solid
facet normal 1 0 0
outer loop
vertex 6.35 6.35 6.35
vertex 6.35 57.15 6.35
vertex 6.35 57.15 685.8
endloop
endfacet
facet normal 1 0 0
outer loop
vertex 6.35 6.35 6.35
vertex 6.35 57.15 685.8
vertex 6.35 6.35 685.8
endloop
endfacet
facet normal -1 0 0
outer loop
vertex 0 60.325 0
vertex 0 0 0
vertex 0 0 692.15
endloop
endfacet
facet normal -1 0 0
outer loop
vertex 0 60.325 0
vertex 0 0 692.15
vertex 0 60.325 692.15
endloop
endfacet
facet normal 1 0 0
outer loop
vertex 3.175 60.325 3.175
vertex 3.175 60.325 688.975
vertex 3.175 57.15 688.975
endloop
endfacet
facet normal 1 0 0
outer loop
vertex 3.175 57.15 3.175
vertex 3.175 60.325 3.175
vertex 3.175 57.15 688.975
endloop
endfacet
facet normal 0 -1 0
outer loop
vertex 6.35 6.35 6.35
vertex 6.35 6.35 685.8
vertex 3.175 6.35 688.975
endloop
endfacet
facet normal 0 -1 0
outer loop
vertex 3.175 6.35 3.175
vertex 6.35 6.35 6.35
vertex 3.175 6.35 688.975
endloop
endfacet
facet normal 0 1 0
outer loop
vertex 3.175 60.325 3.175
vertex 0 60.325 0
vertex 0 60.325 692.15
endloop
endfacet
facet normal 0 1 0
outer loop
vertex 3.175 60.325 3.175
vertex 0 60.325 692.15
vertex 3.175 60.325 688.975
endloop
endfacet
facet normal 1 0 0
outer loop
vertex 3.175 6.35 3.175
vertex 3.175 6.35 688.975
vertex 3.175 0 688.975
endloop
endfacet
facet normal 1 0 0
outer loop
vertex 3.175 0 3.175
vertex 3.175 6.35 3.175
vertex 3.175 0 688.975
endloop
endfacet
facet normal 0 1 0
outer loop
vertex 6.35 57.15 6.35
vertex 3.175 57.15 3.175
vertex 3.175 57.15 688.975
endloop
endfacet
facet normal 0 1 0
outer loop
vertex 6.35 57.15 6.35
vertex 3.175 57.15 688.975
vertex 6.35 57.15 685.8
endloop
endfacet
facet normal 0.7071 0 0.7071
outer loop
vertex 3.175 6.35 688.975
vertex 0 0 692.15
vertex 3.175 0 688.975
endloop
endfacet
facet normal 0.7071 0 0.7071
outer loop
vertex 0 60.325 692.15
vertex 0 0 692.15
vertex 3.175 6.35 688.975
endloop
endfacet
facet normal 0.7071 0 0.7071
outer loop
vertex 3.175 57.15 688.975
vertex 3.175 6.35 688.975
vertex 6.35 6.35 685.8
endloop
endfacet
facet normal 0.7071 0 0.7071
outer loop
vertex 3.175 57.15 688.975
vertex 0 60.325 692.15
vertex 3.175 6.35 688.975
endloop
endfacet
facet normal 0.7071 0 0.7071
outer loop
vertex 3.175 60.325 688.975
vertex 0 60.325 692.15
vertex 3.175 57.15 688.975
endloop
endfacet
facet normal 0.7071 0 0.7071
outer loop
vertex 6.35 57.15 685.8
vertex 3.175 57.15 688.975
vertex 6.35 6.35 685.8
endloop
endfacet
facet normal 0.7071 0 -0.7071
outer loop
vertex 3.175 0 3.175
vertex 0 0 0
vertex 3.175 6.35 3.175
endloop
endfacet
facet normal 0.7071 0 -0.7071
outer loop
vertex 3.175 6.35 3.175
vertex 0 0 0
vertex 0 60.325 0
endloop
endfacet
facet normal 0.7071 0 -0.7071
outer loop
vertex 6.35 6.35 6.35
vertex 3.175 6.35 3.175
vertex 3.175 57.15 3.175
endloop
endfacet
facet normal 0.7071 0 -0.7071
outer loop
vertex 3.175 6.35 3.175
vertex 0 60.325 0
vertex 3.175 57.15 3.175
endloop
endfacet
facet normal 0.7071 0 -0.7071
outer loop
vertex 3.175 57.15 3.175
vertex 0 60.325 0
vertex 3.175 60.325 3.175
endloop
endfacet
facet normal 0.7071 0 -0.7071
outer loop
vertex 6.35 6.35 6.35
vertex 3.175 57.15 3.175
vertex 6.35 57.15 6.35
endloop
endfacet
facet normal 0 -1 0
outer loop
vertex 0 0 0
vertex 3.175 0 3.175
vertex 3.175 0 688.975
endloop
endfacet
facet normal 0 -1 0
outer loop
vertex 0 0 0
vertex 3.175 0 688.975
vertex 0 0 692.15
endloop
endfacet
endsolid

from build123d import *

# Parameters (mm, degrees)
BOSS_EXTRUDE1_DEPTH = 692.15
CUT_EXTRUDE1_DEPTH  = 695.802886166


with BuildPart() as part:
    # Sketch1 → Boss-Extrude1 (new body)
    with BuildSketch(Plane.XY):
        Polygon((0, 0), (0, 60.325), (3.175, 60.325), (3.175, 57.15), (6.35, 57.15), (6.35, 6.35), (3.175, 6.35), (3.175, 0), align=None)
    extrude(amount=BOSS_EXTRUDE1_DEPTH)

    # Sketch2 → Cut-Extrude1 (cut, through all)
    with BuildSketch(Plane(origin=(0, 60.325, 0), x_dir=(1, 0, 0), z_dir=(0, 1, 0))):
        Polygon((0, 0), (6.35, -6.35), (6.35, 0), align=None)
    cut_extrude1 = extrude(amount=-CUT_EXTRUDE1_DEPTH, mode=Mode.SUBTRACT)

    # Mirror1: Cut-Extrude1 across plane
    add(cut_extrude1.mirror(Plane.XY.offset(346.075)), mode=Mode.SUBTRACT)


solid = part.part
